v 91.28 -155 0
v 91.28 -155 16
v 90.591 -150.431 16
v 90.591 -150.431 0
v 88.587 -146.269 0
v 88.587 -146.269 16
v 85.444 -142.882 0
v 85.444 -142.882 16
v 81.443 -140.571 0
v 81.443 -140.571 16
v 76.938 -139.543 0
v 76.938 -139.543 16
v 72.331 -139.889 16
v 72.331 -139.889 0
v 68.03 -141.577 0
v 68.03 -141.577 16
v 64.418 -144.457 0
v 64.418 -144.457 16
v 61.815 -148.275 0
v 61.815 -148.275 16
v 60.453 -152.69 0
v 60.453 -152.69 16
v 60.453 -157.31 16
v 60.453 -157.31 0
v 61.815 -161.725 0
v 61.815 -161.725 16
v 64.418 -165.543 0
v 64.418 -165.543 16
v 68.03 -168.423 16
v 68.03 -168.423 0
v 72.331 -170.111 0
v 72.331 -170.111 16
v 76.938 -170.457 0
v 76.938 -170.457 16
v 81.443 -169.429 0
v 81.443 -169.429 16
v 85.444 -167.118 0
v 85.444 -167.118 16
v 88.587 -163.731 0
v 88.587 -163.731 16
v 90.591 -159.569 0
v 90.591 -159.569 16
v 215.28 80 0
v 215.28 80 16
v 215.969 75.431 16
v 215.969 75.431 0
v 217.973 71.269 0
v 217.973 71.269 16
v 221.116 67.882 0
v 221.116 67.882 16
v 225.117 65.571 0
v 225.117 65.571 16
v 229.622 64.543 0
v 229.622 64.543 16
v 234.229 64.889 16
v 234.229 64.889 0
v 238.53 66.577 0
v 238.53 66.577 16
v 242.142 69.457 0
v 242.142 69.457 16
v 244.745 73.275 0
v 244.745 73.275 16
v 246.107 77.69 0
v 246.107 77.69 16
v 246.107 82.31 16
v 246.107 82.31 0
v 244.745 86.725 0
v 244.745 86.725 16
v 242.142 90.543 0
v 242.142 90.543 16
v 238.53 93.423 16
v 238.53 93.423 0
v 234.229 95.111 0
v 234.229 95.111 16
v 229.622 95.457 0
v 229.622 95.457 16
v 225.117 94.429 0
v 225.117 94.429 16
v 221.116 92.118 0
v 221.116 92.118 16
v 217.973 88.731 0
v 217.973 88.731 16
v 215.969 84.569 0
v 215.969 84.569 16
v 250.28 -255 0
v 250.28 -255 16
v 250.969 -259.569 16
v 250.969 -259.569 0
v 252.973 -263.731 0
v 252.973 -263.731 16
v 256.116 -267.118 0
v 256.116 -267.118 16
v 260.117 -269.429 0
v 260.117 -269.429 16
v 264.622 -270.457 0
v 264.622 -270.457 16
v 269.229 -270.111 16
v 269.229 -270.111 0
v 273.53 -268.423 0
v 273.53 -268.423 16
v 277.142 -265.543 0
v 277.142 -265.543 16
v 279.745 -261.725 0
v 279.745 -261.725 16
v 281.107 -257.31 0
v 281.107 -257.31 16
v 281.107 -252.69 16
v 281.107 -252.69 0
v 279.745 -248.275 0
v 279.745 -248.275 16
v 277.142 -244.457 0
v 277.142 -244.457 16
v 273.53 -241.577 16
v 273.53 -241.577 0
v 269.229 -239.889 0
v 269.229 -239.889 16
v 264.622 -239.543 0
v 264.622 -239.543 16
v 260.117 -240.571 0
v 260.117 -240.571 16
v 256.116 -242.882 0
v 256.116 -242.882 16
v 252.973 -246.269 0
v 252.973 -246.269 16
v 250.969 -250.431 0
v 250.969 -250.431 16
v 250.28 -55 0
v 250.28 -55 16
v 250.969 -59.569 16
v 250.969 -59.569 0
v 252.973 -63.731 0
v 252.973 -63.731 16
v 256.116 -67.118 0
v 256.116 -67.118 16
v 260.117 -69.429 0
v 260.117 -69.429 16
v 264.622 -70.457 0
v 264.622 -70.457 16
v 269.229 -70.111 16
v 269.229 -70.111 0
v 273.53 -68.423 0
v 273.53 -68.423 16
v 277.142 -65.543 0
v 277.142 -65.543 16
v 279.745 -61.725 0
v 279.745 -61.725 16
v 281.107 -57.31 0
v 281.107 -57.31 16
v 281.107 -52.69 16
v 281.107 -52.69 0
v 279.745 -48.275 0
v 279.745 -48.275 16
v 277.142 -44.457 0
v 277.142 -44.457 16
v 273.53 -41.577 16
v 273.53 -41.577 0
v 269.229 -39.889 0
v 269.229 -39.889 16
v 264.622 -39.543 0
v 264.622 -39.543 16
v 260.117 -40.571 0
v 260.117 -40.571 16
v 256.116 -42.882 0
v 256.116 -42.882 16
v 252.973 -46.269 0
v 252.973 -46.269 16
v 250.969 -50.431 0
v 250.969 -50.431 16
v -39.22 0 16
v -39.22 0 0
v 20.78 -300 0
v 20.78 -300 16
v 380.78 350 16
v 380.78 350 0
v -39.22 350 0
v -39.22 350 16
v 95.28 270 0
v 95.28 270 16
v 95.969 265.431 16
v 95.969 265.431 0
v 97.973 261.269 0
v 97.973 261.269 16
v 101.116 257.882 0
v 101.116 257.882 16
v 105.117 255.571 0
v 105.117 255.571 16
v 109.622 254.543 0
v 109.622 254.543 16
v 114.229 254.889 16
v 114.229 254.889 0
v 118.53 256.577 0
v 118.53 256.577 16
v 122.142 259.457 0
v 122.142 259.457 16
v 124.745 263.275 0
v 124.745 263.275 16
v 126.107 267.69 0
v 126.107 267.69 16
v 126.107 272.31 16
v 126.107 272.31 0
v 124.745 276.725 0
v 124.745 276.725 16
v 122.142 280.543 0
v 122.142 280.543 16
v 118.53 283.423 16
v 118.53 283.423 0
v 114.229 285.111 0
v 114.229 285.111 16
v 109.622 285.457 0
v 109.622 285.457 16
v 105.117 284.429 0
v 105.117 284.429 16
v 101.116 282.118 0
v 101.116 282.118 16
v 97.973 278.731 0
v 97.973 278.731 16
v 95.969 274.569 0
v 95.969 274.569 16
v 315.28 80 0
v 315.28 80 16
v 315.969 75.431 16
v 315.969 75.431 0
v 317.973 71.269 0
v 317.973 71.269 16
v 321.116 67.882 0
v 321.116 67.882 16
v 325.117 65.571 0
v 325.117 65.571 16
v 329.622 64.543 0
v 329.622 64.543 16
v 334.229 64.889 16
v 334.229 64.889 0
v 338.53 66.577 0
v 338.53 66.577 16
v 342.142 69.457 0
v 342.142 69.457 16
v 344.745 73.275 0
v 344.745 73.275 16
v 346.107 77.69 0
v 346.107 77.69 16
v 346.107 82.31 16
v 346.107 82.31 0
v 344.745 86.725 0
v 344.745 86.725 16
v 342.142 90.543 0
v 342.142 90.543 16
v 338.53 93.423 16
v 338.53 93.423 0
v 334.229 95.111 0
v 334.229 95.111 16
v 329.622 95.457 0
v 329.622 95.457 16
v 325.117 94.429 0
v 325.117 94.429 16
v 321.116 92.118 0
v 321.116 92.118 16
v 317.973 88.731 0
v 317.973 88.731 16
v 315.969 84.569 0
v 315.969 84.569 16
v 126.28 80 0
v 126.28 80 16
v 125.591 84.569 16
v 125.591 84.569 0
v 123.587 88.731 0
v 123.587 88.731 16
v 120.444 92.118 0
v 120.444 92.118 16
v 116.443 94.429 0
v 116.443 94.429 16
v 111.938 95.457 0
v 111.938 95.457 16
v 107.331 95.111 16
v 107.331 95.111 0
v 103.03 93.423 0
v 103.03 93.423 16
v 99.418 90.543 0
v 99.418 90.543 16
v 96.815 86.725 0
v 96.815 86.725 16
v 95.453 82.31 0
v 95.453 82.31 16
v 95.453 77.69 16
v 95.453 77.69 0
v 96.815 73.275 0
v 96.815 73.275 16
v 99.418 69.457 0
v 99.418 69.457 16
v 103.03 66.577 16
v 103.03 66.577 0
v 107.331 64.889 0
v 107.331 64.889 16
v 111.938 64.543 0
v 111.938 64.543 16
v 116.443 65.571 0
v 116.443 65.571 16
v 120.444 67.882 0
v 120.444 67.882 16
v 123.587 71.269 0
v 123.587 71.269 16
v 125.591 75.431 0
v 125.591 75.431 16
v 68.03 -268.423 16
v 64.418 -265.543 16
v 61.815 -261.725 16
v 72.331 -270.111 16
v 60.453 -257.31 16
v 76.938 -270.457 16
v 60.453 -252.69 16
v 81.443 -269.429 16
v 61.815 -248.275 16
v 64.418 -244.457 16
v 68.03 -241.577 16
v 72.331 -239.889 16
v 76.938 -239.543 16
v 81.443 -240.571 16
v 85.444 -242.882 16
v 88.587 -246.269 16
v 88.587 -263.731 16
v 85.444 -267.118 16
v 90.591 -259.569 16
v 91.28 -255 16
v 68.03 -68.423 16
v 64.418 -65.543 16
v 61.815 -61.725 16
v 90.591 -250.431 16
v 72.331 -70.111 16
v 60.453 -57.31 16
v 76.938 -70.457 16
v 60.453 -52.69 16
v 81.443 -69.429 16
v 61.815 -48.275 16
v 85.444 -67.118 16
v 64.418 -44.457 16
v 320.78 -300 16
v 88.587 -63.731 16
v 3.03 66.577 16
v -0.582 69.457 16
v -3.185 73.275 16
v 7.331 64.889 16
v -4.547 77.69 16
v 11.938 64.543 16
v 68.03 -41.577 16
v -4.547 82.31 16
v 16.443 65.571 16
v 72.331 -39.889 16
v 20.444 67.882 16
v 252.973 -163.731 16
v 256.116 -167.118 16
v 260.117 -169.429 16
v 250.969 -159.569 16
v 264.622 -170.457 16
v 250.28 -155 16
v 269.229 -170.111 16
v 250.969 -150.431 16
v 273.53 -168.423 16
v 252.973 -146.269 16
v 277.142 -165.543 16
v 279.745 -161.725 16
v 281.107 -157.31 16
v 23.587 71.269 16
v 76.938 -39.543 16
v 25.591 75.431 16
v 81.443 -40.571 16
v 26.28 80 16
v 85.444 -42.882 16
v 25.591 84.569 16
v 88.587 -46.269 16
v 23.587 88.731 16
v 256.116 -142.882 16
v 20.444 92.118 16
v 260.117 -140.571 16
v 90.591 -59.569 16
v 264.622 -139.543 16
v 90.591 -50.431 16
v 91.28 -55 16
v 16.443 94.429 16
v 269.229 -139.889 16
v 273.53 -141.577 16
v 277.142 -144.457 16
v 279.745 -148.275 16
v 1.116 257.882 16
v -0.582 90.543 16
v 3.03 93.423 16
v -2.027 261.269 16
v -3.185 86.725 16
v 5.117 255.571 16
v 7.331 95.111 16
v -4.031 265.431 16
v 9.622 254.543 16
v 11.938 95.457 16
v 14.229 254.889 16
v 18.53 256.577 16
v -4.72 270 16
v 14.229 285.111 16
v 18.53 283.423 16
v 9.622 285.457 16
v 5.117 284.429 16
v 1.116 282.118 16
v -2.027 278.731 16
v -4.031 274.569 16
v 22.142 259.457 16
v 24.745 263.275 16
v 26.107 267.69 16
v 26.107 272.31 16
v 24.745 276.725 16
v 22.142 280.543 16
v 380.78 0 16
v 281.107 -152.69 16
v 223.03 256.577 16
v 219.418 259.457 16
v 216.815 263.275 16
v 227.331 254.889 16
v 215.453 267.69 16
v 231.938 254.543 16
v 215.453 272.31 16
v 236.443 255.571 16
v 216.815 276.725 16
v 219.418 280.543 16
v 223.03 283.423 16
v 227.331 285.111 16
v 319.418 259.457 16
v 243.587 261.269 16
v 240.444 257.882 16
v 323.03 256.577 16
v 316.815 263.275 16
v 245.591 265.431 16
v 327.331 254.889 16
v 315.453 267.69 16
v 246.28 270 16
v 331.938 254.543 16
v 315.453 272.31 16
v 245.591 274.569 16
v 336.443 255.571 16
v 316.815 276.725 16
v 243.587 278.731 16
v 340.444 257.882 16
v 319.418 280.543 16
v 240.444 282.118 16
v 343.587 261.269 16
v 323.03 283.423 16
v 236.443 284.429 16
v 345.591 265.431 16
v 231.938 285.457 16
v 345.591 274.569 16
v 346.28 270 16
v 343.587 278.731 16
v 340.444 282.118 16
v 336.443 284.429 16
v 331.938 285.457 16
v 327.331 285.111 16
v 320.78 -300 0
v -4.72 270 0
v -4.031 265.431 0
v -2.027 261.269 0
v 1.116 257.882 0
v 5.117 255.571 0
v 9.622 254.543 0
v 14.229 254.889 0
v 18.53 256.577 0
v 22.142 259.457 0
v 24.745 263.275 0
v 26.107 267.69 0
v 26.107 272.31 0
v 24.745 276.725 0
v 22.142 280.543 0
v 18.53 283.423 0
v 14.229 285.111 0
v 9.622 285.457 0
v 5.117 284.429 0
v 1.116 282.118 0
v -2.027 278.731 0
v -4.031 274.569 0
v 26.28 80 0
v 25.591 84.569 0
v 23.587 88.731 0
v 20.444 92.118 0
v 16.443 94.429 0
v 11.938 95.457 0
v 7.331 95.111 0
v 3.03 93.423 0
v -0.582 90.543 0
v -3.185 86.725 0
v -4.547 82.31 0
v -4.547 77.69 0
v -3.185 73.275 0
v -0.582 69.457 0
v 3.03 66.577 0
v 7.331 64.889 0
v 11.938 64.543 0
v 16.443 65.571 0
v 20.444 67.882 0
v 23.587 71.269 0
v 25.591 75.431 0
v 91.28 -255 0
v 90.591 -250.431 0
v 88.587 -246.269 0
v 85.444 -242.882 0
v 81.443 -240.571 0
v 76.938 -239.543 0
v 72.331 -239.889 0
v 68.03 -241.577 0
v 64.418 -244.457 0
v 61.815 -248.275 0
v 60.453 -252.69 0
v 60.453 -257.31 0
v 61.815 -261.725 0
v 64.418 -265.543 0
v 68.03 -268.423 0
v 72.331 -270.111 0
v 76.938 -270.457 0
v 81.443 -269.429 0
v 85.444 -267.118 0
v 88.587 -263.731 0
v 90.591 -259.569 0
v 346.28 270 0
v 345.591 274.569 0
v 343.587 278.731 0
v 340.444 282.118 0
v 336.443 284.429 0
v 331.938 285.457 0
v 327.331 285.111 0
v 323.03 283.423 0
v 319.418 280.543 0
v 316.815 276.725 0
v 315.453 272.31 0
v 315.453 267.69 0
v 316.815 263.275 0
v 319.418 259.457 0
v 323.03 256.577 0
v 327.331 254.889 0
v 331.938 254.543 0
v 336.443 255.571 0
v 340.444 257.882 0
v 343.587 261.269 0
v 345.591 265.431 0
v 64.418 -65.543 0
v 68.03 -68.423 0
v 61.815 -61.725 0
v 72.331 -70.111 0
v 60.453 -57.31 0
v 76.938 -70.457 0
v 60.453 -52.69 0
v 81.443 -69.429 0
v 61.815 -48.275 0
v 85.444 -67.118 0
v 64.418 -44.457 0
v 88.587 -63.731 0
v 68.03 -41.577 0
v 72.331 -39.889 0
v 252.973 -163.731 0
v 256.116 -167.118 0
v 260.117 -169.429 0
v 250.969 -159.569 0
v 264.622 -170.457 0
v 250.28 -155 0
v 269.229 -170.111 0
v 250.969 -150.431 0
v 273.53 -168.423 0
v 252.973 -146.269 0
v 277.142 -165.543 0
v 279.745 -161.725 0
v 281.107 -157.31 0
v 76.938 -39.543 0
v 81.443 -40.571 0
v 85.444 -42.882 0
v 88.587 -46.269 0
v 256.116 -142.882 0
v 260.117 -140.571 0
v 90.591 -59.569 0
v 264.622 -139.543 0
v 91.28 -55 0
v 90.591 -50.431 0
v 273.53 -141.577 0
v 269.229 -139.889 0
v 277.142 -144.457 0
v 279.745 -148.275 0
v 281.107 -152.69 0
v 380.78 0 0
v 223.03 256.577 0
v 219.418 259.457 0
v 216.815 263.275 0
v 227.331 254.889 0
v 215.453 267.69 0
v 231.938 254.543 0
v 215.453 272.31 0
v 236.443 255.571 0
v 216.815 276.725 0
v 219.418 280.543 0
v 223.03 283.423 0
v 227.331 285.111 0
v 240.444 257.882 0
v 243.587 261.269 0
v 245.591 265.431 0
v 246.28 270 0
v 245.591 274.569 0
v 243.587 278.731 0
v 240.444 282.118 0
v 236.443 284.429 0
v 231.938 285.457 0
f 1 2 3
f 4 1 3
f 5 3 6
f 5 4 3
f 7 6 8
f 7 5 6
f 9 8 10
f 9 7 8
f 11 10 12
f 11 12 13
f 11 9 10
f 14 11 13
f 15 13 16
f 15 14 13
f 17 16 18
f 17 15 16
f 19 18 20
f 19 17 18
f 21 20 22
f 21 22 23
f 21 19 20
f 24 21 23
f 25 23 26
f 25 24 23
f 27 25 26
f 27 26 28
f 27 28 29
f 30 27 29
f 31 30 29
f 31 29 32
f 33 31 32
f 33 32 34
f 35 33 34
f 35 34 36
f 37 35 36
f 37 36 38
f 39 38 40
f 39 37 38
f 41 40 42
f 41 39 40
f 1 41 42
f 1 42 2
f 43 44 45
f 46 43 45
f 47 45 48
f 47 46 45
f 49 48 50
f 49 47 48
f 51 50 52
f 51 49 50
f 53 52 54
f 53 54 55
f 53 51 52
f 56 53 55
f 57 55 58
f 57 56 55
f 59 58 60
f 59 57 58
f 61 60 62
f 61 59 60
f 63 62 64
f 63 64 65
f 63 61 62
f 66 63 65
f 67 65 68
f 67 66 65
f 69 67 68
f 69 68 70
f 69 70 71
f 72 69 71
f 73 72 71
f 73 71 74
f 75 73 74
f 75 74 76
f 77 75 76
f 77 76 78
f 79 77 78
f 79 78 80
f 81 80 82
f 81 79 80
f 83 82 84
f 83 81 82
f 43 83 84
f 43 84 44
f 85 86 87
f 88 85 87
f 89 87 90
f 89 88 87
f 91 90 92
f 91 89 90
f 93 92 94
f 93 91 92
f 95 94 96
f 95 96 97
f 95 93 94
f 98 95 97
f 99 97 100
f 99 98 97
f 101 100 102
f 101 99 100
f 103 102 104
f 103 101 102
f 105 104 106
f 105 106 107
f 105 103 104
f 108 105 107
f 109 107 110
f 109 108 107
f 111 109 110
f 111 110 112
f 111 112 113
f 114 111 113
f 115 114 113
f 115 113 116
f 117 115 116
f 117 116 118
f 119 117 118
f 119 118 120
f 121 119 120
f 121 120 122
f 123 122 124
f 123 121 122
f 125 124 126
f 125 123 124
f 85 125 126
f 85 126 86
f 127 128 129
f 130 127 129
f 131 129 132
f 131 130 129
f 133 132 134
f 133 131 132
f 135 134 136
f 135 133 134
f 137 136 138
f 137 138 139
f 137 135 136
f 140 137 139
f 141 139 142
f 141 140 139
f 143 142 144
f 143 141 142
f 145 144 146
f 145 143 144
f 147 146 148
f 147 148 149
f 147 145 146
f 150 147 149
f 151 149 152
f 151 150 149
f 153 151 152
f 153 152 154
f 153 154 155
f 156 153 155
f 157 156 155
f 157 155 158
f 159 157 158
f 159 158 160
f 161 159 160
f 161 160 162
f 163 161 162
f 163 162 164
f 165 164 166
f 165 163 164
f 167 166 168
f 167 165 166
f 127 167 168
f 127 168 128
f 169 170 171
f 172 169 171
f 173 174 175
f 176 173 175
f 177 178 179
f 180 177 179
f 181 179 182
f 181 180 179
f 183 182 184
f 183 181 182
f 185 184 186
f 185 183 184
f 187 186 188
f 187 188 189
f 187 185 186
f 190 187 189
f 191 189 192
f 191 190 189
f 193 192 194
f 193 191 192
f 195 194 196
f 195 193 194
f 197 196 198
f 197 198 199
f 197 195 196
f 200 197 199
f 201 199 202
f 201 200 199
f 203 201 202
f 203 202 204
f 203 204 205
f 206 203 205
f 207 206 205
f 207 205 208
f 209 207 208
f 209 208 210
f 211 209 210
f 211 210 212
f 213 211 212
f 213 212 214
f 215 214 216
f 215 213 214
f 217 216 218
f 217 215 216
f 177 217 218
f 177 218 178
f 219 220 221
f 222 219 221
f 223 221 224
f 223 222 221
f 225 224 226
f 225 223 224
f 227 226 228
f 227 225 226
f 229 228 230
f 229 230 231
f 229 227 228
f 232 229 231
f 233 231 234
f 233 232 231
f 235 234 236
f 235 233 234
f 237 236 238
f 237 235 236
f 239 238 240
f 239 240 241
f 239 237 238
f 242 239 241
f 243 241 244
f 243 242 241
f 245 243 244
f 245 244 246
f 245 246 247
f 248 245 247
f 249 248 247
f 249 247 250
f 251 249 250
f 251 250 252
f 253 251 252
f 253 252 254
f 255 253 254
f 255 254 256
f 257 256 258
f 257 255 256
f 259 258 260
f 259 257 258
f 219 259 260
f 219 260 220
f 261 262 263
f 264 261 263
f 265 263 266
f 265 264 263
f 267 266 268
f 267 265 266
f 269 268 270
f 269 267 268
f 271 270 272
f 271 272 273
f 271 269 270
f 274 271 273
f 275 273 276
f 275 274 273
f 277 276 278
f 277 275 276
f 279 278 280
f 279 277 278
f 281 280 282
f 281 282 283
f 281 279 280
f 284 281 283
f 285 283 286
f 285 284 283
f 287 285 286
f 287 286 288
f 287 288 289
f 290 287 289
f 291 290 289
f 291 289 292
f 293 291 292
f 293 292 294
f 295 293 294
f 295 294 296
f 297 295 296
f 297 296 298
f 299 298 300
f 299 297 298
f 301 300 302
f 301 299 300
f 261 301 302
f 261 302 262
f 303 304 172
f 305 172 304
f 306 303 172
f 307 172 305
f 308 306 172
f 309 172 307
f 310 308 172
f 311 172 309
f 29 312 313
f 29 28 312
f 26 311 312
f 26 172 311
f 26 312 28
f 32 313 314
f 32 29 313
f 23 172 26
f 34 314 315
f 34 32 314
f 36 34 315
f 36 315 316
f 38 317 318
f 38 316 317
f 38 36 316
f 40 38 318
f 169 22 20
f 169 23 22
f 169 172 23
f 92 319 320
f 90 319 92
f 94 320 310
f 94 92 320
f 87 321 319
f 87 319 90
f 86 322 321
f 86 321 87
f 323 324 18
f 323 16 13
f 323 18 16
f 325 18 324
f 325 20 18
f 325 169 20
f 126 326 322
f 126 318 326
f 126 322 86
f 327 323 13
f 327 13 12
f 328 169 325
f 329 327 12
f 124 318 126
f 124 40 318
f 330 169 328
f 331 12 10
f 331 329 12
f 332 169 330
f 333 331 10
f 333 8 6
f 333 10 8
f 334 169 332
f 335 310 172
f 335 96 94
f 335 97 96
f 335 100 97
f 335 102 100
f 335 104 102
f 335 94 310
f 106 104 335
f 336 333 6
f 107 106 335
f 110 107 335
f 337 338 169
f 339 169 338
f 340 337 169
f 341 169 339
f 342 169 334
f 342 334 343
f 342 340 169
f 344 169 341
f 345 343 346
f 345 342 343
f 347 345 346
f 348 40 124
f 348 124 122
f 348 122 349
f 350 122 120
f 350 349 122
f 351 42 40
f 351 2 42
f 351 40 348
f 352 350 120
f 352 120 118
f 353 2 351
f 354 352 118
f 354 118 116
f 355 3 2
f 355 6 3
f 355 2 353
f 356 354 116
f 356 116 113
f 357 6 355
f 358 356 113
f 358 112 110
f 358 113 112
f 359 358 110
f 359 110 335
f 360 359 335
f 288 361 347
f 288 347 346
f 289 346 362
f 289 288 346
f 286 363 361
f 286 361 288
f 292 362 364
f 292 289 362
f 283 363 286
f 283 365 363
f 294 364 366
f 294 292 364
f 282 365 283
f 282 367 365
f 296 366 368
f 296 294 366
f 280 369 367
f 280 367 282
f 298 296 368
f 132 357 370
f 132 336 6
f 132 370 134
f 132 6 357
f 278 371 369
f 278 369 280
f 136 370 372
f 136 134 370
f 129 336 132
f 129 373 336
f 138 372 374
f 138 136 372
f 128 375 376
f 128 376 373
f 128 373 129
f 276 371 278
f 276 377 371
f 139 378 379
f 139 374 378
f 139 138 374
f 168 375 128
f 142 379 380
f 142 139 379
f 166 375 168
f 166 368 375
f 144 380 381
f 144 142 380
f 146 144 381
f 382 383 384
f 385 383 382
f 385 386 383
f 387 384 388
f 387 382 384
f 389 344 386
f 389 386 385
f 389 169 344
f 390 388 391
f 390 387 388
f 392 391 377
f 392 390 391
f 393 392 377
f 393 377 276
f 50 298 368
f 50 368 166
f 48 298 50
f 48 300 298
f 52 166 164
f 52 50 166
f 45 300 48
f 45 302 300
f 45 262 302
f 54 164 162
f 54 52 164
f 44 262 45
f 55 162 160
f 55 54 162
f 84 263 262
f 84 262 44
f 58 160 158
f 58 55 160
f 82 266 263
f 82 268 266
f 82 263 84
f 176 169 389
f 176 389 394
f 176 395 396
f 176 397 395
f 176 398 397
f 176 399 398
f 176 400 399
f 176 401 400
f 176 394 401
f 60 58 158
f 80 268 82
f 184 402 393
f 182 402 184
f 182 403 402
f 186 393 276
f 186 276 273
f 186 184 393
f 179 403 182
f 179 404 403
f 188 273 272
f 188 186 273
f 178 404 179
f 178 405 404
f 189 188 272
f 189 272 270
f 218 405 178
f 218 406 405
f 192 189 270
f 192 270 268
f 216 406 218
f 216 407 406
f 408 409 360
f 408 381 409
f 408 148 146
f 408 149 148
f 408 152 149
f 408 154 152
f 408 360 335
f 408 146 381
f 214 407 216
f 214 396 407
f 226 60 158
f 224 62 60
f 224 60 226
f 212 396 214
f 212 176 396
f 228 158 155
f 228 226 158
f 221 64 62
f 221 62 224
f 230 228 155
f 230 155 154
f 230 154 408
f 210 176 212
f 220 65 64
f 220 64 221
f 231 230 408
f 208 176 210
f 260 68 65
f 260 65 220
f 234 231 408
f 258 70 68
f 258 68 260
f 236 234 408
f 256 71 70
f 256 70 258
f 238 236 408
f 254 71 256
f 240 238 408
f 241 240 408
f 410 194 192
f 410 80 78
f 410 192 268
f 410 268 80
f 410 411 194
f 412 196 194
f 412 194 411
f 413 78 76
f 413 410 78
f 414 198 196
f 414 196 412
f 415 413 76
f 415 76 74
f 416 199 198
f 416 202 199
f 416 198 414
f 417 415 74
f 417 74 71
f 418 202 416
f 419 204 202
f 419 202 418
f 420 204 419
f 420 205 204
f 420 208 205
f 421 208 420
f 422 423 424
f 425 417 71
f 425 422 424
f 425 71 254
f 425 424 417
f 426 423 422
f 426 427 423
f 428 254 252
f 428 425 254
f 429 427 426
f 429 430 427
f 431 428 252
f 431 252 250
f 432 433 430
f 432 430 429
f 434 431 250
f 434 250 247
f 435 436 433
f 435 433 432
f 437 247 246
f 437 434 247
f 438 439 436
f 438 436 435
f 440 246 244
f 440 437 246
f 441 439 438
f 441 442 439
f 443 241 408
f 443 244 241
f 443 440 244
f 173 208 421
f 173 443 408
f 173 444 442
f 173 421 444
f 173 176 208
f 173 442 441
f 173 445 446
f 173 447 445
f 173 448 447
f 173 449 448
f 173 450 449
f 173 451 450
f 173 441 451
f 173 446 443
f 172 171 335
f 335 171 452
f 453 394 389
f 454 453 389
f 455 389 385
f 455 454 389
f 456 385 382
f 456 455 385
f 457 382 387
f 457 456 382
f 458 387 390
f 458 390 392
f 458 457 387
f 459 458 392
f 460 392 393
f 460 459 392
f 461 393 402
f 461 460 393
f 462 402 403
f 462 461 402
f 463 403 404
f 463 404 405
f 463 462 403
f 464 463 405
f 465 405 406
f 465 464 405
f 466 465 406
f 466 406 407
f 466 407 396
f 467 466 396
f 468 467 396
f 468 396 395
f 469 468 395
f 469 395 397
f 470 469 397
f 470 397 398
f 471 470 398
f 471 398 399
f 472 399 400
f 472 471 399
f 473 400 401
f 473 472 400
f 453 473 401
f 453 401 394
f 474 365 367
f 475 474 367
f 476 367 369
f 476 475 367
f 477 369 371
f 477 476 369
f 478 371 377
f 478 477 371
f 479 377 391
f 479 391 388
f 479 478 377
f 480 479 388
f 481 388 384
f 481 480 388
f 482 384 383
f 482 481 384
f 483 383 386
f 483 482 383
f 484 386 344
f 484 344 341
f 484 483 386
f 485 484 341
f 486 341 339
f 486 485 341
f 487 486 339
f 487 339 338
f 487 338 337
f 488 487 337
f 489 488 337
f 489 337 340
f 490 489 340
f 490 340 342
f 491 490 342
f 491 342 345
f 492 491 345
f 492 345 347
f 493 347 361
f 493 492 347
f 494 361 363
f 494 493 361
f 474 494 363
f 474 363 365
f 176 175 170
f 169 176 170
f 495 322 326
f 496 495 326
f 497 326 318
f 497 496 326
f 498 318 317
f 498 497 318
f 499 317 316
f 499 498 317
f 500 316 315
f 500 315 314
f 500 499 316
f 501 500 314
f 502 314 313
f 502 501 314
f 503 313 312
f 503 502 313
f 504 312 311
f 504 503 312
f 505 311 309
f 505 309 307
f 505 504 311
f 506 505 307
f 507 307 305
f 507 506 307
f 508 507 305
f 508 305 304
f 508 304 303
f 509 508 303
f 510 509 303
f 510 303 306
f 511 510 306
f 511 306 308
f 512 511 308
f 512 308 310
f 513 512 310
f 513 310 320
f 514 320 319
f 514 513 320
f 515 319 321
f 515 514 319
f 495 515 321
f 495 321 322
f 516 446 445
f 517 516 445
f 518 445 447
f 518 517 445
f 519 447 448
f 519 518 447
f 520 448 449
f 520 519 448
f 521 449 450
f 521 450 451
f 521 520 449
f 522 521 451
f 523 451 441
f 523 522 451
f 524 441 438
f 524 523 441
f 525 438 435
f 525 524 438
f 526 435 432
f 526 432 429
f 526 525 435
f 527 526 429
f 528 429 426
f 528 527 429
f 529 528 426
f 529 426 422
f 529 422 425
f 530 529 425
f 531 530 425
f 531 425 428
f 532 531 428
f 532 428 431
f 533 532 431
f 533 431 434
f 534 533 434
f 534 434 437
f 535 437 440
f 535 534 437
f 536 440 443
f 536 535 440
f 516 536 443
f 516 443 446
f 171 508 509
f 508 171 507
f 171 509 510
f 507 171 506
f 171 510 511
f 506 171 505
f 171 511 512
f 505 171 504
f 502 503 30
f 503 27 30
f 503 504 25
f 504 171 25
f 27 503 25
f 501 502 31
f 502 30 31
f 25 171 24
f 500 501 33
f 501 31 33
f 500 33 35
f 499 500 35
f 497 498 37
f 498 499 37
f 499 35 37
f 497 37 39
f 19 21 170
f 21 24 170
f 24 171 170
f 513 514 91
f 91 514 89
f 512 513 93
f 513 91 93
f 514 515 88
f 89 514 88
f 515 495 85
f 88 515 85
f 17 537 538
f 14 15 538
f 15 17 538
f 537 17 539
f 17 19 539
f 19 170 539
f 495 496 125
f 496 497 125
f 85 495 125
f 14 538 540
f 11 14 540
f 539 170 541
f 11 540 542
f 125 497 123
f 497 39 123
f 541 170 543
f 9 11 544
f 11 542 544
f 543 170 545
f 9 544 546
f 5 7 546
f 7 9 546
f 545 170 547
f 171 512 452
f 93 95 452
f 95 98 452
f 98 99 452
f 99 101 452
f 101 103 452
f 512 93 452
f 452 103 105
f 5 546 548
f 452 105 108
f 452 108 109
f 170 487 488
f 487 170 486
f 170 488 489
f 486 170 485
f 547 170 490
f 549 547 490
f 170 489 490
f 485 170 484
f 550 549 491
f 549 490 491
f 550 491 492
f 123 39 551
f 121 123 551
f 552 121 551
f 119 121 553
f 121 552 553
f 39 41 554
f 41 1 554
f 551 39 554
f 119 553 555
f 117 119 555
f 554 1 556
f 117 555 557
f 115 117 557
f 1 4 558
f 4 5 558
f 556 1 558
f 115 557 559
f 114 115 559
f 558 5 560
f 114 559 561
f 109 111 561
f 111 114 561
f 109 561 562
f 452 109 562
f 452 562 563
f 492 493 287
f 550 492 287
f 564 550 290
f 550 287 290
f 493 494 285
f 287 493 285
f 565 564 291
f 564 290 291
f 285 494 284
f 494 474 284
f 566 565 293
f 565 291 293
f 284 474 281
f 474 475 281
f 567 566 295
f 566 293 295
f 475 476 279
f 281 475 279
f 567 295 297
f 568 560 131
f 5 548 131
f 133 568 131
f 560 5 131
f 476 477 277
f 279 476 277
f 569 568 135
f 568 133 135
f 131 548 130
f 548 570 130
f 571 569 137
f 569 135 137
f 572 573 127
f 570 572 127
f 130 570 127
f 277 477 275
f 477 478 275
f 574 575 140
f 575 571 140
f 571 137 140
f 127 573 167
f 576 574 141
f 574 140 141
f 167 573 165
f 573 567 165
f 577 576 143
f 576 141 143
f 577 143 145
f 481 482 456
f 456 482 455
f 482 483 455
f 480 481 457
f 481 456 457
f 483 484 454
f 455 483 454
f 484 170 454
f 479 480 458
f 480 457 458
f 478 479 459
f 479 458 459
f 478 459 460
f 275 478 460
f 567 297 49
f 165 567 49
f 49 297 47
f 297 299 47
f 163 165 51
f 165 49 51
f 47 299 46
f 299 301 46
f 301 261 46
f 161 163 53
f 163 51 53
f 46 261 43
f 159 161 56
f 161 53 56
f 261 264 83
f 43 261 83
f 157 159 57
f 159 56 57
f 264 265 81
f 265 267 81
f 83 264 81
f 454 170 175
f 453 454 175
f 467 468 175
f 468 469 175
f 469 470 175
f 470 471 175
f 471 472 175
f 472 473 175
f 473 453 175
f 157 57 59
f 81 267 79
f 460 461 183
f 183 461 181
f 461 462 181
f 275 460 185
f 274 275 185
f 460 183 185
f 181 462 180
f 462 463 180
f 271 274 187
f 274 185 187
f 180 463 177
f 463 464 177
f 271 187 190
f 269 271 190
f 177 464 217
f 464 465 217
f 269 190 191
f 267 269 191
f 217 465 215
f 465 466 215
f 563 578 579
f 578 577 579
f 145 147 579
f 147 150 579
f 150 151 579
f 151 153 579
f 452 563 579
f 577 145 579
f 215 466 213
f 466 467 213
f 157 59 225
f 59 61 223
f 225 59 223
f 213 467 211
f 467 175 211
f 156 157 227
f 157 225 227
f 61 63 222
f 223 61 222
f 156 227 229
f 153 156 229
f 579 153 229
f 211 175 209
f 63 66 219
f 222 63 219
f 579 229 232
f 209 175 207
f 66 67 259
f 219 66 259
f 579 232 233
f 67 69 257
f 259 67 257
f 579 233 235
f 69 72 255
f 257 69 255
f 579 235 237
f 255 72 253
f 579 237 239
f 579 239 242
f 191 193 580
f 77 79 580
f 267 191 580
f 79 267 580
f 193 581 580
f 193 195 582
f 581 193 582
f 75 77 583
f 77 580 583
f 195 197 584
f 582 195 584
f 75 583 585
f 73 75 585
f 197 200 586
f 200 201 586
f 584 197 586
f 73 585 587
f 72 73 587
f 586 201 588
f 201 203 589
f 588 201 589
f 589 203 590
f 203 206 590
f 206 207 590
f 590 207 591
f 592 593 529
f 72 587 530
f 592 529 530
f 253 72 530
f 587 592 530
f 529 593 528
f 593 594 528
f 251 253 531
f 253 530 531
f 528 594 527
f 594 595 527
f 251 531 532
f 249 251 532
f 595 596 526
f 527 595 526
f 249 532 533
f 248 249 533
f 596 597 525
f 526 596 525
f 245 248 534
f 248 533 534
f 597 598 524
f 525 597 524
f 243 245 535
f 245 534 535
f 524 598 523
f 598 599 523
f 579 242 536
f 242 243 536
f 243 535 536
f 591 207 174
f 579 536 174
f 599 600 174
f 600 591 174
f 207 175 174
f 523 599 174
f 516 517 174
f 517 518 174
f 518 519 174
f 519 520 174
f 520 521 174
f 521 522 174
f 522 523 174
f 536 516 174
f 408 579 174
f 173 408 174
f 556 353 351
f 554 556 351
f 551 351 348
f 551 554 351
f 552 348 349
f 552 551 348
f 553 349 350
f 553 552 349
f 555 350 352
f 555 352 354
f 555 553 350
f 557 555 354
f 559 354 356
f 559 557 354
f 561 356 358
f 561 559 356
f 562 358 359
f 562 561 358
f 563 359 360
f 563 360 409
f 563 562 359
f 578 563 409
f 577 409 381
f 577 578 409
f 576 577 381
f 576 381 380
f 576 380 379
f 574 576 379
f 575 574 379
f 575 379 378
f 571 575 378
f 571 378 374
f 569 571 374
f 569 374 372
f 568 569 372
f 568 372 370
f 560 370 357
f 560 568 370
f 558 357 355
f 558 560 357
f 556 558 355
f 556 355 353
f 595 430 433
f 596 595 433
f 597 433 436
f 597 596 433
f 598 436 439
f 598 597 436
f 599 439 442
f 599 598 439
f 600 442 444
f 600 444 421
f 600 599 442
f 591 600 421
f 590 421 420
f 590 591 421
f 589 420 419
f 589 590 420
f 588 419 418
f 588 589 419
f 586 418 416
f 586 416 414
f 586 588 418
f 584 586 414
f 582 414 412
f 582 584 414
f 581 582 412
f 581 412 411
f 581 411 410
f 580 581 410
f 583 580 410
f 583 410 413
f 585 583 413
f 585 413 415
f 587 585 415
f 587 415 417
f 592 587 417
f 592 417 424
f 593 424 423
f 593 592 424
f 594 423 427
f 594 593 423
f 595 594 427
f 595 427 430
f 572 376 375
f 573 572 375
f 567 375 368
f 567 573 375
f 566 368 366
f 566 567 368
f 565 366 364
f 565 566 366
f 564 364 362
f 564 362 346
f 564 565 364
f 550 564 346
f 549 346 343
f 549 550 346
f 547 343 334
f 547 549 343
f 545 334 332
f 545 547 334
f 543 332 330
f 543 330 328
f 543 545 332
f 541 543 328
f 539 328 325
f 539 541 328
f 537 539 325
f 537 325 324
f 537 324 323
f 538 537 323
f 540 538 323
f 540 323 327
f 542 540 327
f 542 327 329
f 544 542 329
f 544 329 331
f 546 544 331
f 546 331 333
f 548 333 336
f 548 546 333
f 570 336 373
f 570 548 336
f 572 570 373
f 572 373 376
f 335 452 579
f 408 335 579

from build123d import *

# Parameters (mm, degrees)
SKETCH_1_R      = 15.5
EXTRUDE_1_DEPTH = 16


with BuildPart() as part:
    # 草图1 → 拉伸1 (new body)
    with BuildSketch(Plane.XY):
        Polygon((380.780090503, 350), (-39.219909497, 350), (-39.219909497, 0), (20.780090503, -300), (320.780090503, -300), (380.780090503, 0), align=None)
        with Locations((75.780090503, -255)):
            Circle(SKETCH_1_R, mode=Mode.SUBTRACT)
        with Locations((75.780090503, -55)):
            Circle(SKETCH_1_R, mode=Mode.SUBTRACT)
        with Locations((75.780090503, -155)):
            Circle(SKETCH_1_R, mode=Mode.SUBTRACT)
        with Locations((110.780090503, 80)):
            Circle(SKETCH_1_R, mode=Mode.SUBTRACT)
        with Locations((10.780090503, 80)):
            Circle(SKETCH_1_R, mode=Mode.SUBTRACT)
        with Locations(Location((110.780090503, 270, 0), (0, 0, 180))):
            Circle(SKETCH_1_R, mode=Mode.SUBTRACT)
        with Locations(Location((10.780090503, 270, 0), (0, 0, 180))):
            Circle(SKETCH_1_R, mode=Mode.SUBTRACT)
        with Locations((330.780090503, 270)):
            Circle(SKETCH_1_R, mode=Mode.SUBTRACT)
        with Locations((230.780090503, 270)):
            Circle(SKETCH_1_R, mode=Mode.SUBTRACT)
        with Locations(Location((330.780090503, 80, 0), (0, 0, 180))):
            Circle(SKETCH_1_R, mode=Mode.SUBTRACT)
        with Locations(Location((230.780090503, 80, 0), (0, 0, 180))):
            Circle(SKETCH_1_R, mode=Mode.SUBTRACT)
        with Locations(Location((265.780090503, -155, 0), (0, 0, 180))):
            Circle(SKETCH_1_R, mode=Mode.SUBTRACT)
        with Locations(Location((265.780090503, -55, 0), (0, 0, 180))):
            Circle(SKETCH_1_R, mode=Mode.SUBTRACT)
        with Locations(Location((265.780090503, -255, 0), (0, 0, 180))):
            Circle(SKETCH_1_R, mode=Mode.SUBTRACT)
    extrude(amount=EXTRUDE_1_DEPTH)


solid = part.part
